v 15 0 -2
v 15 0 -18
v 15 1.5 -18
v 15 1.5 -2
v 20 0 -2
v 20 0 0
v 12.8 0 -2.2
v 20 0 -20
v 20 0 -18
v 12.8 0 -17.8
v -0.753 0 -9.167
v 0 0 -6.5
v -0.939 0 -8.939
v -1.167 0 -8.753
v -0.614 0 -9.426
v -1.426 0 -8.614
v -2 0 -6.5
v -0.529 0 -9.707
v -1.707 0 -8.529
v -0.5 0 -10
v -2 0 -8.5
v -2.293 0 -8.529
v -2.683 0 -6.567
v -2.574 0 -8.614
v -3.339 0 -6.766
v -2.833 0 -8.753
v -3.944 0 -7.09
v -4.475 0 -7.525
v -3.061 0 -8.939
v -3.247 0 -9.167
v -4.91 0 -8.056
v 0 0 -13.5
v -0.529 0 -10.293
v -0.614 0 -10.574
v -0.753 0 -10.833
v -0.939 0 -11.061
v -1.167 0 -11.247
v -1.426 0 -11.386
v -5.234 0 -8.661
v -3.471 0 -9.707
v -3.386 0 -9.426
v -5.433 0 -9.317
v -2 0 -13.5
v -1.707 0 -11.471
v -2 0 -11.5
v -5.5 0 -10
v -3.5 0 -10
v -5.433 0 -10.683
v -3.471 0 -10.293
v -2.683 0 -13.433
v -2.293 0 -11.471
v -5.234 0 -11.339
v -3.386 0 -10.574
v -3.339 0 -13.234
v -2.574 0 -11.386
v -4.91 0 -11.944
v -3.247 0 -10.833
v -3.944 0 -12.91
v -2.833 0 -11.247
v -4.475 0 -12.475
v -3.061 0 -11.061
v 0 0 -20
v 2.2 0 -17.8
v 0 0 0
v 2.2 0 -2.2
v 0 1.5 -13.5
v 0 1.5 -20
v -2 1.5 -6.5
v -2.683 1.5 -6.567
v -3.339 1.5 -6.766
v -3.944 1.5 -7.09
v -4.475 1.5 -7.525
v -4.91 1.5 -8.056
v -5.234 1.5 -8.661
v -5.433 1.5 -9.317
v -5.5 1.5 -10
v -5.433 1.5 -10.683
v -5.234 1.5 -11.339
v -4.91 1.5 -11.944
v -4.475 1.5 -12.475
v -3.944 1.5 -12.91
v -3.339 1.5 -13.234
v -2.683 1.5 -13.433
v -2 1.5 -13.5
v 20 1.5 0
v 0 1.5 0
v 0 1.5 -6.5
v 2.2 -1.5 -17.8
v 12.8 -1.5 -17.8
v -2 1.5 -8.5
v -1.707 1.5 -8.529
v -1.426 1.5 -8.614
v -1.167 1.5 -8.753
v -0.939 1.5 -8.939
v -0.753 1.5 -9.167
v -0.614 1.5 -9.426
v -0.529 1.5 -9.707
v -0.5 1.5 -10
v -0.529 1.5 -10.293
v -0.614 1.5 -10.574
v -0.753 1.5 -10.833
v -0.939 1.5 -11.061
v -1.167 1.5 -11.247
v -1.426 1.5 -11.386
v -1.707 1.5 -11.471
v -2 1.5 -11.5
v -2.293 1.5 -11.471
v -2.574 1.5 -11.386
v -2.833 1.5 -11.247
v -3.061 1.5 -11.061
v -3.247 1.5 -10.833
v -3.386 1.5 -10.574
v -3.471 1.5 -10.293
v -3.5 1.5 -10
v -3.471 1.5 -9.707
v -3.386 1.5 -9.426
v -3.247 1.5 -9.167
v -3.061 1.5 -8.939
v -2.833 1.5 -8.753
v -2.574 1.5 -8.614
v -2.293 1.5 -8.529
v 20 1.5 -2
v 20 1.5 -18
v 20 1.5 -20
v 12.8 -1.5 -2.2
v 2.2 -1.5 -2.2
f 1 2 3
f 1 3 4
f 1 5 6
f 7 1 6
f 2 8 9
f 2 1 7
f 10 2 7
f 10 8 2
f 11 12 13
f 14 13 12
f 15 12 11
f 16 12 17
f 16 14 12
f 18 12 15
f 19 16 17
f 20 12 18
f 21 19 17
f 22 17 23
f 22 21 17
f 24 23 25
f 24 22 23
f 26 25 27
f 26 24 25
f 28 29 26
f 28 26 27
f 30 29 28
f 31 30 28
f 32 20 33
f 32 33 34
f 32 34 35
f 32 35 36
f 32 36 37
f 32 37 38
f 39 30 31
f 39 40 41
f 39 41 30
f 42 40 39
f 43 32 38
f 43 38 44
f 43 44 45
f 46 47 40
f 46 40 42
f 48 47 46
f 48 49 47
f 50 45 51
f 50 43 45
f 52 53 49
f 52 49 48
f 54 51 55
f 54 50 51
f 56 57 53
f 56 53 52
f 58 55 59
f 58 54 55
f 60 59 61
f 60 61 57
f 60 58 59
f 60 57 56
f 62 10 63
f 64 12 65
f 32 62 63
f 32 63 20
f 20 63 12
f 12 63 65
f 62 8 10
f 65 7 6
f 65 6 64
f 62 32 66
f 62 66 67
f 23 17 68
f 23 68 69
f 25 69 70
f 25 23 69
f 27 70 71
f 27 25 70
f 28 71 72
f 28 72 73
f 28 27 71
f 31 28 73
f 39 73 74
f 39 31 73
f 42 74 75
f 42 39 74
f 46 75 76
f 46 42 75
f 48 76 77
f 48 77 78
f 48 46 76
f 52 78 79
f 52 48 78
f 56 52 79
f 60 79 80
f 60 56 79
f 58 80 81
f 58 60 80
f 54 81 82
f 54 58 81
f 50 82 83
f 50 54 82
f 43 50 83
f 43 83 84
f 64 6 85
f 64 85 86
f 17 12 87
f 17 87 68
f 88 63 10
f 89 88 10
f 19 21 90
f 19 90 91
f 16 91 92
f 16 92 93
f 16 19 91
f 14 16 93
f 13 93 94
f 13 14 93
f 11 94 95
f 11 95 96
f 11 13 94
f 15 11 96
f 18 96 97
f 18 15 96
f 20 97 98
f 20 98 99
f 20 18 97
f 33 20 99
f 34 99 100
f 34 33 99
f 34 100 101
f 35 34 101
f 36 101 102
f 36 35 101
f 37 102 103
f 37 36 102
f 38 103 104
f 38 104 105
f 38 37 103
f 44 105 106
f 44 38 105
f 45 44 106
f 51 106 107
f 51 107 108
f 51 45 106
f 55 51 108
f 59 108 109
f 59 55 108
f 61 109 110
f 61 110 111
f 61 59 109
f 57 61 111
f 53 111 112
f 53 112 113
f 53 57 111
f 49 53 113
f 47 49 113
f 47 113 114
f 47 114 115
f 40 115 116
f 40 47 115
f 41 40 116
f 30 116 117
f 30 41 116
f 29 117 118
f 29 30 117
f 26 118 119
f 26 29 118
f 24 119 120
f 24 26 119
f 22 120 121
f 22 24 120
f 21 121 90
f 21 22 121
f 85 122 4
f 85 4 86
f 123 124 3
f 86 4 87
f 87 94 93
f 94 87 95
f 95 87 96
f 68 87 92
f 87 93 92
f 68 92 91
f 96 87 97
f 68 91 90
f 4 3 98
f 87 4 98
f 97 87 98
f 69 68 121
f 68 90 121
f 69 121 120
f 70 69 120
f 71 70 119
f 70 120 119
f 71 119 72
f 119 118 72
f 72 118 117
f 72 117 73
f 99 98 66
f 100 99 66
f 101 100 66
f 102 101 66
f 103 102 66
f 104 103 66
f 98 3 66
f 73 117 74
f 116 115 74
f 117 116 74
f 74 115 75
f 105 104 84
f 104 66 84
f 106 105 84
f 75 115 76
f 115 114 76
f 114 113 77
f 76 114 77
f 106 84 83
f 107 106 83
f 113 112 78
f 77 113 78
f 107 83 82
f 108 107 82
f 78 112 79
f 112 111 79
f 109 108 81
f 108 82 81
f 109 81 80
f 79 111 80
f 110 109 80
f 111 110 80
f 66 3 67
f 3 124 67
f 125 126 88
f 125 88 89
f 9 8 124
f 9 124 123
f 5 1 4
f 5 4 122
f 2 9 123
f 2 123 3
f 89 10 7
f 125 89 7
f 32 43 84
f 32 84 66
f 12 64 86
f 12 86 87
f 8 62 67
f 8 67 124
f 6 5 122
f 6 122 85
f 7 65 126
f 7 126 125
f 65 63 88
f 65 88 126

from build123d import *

# Parameters (mm, degrees)
SKETCH2_R           = 1.5
BOSS_EXTRUDE1_DEPTH = 1.5
SKETCH3_W           = 10.6
SKETCH3_H           = 15.6
BOSS_EXTRUDE2_DEPTH = 1.5


with BuildPart() as part:
    # Sketch2 → Boss-Extrude1 (new body)
    with BuildSketch(Plane(origin=(0, 0, 0), x_dir=(1, 0, 0), z_dir=(0, 1, 0))):
        with BuildLine():
            Line((15, 18), (15, 2))
            Line((15, 2), (20, 2))
            Line((20, 2), (20, 0))
            Line((20, 0), (15, 0))
            Line((15, 0), (0, 0))
            Line((0, 0), (0, 6.5))
            Line((0, 6.5), (-2, 6.5))
            ThreePointArc((-2, 6.5), (-5.5, 10), (-2, 13.5))
            Line((-2, 13.5), (0, 13.5))
            Line((0, 13.5), (0, 20))
            Line((0, 20), (15, 20))
            Line((15, 20), (20, 20))
            Line((20, 20), (20, 18))
            Line((20, 18), (15, 18))
        make_face()
        with Locations(Location((-2, 10, 0), (0, 0, 270))):
            Circle(SKETCH2_R, mode=Mode.SUBTRACT)
    extrude(amount=BOSS_EXTRUDE1_DEPTH)

    # Sketch3 → Boss-Extrude2 (add)
    with BuildSketch(Plane.XZ):
        with Locations((7.5, -10)):
            Rectangle(SKETCH3_W, SKETCH3_H)
    extrude(amount=BOSS_EXTRUDE2_DEPTH)


solid = part.part
